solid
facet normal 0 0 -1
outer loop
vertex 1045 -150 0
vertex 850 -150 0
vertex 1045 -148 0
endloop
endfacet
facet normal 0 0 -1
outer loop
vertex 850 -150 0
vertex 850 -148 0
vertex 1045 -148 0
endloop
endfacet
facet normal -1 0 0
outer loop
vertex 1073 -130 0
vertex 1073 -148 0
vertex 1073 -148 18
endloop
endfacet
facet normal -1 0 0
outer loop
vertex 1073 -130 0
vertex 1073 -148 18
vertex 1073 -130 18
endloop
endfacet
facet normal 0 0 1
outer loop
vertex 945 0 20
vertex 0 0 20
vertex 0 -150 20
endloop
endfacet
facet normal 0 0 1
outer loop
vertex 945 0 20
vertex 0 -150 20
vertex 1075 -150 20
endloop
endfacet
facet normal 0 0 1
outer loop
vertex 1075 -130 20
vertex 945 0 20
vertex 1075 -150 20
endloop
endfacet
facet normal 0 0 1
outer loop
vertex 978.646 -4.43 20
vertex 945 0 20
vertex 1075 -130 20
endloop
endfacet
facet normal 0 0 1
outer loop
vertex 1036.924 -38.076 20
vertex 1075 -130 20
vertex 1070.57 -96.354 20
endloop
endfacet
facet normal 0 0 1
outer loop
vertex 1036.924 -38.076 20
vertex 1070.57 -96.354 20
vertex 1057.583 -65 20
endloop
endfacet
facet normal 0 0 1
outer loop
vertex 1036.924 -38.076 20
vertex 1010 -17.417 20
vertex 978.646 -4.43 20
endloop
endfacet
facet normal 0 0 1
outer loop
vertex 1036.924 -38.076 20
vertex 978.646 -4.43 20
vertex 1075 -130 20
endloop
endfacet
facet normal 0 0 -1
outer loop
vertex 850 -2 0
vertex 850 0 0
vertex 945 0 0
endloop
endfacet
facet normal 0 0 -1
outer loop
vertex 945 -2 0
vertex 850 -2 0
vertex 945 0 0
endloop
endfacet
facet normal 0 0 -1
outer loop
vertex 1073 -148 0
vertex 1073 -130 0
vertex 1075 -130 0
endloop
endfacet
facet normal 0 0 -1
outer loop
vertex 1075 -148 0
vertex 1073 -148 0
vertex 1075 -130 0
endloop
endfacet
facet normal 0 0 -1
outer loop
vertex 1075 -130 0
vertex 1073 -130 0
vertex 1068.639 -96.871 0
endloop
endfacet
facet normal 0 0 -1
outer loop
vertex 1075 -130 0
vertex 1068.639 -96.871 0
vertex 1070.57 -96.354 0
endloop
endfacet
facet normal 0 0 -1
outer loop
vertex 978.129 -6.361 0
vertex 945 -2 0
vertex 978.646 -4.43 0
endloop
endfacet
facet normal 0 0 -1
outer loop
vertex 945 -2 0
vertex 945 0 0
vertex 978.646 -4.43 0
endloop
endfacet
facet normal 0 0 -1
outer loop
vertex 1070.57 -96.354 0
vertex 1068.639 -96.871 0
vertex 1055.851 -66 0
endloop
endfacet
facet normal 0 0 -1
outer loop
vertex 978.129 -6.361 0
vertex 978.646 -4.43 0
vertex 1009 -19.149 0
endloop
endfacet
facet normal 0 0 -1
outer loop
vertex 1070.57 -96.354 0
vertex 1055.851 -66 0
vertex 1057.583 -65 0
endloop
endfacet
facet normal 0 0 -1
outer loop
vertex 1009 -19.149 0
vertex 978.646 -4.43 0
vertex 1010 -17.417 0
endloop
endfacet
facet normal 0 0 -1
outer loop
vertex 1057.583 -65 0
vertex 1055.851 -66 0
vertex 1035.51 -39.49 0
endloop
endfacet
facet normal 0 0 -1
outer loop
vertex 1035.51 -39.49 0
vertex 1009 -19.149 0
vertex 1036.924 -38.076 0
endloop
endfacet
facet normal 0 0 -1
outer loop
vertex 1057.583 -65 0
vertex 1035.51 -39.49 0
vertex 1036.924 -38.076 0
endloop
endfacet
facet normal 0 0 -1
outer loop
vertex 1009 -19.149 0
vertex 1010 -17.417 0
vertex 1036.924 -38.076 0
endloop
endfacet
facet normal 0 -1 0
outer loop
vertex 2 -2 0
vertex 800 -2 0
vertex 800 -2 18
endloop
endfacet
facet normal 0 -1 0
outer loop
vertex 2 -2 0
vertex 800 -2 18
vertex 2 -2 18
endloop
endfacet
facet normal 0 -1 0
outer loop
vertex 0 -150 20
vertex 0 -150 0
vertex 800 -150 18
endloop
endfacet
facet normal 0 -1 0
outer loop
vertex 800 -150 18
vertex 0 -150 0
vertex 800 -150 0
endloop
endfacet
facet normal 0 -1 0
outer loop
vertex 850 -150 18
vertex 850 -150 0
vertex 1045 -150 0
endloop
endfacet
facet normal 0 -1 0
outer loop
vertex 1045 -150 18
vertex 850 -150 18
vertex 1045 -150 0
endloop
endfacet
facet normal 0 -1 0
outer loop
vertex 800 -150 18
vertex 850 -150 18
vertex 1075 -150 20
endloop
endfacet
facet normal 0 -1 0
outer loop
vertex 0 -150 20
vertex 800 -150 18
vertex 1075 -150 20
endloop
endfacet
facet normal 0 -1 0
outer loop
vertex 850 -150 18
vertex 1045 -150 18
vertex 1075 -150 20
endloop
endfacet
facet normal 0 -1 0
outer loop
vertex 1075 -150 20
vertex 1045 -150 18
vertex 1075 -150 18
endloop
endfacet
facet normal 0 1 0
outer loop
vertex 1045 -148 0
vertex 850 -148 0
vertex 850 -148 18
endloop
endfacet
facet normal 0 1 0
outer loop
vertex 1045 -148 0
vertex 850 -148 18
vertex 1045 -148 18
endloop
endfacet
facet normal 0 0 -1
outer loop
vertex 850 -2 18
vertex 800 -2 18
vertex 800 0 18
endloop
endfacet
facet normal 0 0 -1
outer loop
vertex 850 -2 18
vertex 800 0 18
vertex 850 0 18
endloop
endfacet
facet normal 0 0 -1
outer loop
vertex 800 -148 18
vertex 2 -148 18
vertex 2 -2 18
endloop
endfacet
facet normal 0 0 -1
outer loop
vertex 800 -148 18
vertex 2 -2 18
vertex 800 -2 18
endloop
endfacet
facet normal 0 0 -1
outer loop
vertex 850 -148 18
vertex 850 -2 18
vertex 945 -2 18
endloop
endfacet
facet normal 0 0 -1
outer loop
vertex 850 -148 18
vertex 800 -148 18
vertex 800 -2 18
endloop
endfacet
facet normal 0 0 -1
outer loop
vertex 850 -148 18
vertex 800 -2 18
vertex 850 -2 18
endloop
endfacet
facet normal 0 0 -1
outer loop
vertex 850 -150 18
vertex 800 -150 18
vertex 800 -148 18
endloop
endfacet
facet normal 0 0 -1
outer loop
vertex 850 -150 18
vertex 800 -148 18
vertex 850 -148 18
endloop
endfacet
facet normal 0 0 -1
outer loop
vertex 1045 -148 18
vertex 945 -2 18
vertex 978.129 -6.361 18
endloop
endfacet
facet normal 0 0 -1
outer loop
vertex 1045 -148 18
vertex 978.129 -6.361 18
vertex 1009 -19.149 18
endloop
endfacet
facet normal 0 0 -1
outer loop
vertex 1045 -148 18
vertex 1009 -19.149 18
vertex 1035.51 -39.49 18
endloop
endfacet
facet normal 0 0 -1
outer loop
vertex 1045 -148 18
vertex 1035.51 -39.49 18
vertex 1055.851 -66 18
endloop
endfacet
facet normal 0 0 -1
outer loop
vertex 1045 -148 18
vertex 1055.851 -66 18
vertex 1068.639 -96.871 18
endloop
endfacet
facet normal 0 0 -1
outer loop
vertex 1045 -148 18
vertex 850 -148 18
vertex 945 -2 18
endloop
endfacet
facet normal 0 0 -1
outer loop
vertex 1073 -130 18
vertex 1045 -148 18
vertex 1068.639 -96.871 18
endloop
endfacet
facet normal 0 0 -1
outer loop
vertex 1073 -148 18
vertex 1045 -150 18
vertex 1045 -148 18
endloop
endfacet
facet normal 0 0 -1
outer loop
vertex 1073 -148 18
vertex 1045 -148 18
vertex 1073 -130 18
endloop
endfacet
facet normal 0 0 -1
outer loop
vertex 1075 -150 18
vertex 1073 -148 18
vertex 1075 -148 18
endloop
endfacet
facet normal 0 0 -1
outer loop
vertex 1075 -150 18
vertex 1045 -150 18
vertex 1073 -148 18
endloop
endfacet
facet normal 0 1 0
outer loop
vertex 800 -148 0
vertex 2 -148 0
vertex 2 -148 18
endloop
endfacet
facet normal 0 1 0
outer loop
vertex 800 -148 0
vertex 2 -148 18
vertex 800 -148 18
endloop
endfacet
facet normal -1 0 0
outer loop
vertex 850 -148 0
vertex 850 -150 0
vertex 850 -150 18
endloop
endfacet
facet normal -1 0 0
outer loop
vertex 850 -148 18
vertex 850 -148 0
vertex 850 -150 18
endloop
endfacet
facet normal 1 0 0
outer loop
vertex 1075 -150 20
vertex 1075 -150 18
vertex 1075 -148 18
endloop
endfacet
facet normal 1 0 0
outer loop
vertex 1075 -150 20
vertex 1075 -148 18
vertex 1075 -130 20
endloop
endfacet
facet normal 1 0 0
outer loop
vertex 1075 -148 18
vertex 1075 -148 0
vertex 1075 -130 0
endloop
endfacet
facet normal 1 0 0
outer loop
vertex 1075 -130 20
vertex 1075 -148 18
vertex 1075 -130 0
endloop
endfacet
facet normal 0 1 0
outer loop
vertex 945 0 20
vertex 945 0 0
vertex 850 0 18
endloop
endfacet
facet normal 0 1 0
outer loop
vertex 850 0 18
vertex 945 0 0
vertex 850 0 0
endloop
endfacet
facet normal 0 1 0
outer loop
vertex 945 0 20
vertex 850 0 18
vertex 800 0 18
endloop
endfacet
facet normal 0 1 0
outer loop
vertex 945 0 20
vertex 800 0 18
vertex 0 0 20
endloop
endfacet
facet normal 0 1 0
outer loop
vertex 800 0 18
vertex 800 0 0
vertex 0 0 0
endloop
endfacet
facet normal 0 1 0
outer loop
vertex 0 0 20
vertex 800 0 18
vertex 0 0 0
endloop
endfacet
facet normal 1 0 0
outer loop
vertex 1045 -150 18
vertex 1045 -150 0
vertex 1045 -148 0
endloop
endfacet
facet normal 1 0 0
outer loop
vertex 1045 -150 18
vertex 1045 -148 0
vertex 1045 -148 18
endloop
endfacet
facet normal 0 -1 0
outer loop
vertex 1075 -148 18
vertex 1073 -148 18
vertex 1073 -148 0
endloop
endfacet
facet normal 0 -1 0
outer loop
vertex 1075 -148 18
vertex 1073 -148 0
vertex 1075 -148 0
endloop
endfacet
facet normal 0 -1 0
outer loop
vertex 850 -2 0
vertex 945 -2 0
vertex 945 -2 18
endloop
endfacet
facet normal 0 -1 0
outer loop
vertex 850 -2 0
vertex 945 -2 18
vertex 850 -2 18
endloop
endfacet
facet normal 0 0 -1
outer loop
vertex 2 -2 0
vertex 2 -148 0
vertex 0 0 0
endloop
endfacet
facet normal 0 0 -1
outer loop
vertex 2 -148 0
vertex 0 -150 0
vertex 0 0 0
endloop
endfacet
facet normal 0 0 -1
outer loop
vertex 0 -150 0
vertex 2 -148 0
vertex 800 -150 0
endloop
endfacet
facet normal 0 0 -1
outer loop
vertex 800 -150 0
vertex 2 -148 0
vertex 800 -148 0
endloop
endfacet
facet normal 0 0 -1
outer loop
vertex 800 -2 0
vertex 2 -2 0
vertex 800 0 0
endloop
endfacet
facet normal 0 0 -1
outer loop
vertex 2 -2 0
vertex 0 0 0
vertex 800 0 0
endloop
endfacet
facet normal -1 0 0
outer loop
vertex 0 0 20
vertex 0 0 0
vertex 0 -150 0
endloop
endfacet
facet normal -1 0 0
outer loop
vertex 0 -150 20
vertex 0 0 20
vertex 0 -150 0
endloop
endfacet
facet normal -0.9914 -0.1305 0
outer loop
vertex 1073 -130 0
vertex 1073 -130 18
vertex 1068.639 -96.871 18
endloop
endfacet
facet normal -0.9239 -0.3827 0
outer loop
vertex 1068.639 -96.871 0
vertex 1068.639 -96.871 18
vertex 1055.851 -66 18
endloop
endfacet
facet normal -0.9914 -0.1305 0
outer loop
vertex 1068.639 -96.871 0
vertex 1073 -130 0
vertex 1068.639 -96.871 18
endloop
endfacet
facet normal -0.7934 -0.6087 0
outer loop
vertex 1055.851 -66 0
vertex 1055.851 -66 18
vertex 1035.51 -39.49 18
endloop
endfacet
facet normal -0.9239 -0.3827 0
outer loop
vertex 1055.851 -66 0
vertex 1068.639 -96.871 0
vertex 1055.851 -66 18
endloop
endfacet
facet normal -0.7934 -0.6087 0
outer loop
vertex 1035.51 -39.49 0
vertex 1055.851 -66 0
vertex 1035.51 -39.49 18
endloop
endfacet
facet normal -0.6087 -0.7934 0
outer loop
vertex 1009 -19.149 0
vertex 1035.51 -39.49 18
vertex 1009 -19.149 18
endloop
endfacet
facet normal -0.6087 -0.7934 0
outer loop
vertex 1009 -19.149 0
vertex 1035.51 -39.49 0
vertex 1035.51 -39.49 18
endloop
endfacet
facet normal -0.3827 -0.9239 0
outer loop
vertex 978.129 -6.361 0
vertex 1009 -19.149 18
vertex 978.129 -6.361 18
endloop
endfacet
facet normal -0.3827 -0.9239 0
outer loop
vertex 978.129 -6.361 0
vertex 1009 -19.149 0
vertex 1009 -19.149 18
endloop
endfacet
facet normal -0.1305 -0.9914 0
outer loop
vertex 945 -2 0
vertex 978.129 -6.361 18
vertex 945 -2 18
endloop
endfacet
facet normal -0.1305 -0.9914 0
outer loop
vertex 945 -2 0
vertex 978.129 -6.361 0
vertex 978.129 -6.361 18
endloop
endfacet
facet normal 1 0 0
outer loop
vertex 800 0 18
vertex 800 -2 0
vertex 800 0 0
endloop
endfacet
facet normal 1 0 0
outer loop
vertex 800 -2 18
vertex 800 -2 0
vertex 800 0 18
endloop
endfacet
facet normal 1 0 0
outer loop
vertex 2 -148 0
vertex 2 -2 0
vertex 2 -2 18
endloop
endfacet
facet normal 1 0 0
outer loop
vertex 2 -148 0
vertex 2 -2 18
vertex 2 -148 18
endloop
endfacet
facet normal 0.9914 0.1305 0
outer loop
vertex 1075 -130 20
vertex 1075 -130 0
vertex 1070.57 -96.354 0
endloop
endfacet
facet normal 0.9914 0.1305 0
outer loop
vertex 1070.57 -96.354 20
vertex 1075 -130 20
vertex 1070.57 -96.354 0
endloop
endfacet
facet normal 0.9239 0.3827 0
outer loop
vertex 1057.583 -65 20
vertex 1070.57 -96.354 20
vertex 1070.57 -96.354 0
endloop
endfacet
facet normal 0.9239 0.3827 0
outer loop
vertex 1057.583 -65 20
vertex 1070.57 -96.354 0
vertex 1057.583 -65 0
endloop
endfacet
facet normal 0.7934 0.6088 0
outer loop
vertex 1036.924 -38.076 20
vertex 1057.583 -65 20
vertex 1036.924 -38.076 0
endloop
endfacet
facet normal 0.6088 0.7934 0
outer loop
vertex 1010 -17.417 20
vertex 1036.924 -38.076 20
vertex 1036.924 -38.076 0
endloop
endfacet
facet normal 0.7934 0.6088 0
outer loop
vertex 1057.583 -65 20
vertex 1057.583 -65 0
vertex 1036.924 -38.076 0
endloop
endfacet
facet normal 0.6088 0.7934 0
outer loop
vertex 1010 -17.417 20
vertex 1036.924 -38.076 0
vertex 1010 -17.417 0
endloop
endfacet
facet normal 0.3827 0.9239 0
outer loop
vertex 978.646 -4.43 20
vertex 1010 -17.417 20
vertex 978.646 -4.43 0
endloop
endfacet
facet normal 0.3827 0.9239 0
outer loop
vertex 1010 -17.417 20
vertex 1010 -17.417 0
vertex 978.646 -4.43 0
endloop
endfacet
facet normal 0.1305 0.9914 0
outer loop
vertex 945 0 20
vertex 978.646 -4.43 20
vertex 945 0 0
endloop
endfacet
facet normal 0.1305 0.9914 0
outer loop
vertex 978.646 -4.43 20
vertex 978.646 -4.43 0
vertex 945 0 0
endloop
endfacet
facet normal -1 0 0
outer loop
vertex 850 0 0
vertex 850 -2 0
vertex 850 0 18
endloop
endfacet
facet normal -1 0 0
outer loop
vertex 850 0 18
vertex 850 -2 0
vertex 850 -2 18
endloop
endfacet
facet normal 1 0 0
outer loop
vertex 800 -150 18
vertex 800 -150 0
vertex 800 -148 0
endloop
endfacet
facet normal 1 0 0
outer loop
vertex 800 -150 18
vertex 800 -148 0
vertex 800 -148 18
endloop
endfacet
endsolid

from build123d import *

# Parameters (mm, degrees)
F1_DEPTH = 20
F2_T     = -2
F3_W     = 50
F3_H     = 18
F4_DEPTH = 600
F5_W     = 30
F5_H     = 18
F6_DEPTH = 2


with BuildPart() as f1:
    # F0 (on Top) → F1 (new body)
    with BuildSketch(Plane.XY):
        with BuildLine():
            Line((945, 0), (0, 0))
            Line((0, 0), (0, -150))
            Line((0, -150), (1075, -150))
            Line((1075, -150), (1075, -130))
            ThreePointArc((1075, -130), (1036.923882, -38.076118), (945, 0))
        make_face()
    extrude(amount=F1_DEPTH)

    # F2
    f2_openings = [f1.faces().sort_by_distance(p)[0] for p in [
        (525.800735, -76.057549, 0),
    ]]
    offset(amount=F2_T, openings=f2_openings)

    # F3 (on face) → F4 (cut)
    with BuildSketch(Plane.XZ.offset(150)):
        with Locations((825, 9)):
            Rectangle(F3_W, F3_H)
    extrude(amount=-F4_DEPTH, mode=Mode.SUBTRACT)

    # F5 (on face) → F6 (cut)
    with BuildSketch(Plane.XZ.offset(150)):
        with Locations((1060, 9)):
            Rectangle(F5_W, F5_H)
    extrude(amount=-F6_DEPTH, mode=Mode.SUBTRACT)


solid = f1.part
